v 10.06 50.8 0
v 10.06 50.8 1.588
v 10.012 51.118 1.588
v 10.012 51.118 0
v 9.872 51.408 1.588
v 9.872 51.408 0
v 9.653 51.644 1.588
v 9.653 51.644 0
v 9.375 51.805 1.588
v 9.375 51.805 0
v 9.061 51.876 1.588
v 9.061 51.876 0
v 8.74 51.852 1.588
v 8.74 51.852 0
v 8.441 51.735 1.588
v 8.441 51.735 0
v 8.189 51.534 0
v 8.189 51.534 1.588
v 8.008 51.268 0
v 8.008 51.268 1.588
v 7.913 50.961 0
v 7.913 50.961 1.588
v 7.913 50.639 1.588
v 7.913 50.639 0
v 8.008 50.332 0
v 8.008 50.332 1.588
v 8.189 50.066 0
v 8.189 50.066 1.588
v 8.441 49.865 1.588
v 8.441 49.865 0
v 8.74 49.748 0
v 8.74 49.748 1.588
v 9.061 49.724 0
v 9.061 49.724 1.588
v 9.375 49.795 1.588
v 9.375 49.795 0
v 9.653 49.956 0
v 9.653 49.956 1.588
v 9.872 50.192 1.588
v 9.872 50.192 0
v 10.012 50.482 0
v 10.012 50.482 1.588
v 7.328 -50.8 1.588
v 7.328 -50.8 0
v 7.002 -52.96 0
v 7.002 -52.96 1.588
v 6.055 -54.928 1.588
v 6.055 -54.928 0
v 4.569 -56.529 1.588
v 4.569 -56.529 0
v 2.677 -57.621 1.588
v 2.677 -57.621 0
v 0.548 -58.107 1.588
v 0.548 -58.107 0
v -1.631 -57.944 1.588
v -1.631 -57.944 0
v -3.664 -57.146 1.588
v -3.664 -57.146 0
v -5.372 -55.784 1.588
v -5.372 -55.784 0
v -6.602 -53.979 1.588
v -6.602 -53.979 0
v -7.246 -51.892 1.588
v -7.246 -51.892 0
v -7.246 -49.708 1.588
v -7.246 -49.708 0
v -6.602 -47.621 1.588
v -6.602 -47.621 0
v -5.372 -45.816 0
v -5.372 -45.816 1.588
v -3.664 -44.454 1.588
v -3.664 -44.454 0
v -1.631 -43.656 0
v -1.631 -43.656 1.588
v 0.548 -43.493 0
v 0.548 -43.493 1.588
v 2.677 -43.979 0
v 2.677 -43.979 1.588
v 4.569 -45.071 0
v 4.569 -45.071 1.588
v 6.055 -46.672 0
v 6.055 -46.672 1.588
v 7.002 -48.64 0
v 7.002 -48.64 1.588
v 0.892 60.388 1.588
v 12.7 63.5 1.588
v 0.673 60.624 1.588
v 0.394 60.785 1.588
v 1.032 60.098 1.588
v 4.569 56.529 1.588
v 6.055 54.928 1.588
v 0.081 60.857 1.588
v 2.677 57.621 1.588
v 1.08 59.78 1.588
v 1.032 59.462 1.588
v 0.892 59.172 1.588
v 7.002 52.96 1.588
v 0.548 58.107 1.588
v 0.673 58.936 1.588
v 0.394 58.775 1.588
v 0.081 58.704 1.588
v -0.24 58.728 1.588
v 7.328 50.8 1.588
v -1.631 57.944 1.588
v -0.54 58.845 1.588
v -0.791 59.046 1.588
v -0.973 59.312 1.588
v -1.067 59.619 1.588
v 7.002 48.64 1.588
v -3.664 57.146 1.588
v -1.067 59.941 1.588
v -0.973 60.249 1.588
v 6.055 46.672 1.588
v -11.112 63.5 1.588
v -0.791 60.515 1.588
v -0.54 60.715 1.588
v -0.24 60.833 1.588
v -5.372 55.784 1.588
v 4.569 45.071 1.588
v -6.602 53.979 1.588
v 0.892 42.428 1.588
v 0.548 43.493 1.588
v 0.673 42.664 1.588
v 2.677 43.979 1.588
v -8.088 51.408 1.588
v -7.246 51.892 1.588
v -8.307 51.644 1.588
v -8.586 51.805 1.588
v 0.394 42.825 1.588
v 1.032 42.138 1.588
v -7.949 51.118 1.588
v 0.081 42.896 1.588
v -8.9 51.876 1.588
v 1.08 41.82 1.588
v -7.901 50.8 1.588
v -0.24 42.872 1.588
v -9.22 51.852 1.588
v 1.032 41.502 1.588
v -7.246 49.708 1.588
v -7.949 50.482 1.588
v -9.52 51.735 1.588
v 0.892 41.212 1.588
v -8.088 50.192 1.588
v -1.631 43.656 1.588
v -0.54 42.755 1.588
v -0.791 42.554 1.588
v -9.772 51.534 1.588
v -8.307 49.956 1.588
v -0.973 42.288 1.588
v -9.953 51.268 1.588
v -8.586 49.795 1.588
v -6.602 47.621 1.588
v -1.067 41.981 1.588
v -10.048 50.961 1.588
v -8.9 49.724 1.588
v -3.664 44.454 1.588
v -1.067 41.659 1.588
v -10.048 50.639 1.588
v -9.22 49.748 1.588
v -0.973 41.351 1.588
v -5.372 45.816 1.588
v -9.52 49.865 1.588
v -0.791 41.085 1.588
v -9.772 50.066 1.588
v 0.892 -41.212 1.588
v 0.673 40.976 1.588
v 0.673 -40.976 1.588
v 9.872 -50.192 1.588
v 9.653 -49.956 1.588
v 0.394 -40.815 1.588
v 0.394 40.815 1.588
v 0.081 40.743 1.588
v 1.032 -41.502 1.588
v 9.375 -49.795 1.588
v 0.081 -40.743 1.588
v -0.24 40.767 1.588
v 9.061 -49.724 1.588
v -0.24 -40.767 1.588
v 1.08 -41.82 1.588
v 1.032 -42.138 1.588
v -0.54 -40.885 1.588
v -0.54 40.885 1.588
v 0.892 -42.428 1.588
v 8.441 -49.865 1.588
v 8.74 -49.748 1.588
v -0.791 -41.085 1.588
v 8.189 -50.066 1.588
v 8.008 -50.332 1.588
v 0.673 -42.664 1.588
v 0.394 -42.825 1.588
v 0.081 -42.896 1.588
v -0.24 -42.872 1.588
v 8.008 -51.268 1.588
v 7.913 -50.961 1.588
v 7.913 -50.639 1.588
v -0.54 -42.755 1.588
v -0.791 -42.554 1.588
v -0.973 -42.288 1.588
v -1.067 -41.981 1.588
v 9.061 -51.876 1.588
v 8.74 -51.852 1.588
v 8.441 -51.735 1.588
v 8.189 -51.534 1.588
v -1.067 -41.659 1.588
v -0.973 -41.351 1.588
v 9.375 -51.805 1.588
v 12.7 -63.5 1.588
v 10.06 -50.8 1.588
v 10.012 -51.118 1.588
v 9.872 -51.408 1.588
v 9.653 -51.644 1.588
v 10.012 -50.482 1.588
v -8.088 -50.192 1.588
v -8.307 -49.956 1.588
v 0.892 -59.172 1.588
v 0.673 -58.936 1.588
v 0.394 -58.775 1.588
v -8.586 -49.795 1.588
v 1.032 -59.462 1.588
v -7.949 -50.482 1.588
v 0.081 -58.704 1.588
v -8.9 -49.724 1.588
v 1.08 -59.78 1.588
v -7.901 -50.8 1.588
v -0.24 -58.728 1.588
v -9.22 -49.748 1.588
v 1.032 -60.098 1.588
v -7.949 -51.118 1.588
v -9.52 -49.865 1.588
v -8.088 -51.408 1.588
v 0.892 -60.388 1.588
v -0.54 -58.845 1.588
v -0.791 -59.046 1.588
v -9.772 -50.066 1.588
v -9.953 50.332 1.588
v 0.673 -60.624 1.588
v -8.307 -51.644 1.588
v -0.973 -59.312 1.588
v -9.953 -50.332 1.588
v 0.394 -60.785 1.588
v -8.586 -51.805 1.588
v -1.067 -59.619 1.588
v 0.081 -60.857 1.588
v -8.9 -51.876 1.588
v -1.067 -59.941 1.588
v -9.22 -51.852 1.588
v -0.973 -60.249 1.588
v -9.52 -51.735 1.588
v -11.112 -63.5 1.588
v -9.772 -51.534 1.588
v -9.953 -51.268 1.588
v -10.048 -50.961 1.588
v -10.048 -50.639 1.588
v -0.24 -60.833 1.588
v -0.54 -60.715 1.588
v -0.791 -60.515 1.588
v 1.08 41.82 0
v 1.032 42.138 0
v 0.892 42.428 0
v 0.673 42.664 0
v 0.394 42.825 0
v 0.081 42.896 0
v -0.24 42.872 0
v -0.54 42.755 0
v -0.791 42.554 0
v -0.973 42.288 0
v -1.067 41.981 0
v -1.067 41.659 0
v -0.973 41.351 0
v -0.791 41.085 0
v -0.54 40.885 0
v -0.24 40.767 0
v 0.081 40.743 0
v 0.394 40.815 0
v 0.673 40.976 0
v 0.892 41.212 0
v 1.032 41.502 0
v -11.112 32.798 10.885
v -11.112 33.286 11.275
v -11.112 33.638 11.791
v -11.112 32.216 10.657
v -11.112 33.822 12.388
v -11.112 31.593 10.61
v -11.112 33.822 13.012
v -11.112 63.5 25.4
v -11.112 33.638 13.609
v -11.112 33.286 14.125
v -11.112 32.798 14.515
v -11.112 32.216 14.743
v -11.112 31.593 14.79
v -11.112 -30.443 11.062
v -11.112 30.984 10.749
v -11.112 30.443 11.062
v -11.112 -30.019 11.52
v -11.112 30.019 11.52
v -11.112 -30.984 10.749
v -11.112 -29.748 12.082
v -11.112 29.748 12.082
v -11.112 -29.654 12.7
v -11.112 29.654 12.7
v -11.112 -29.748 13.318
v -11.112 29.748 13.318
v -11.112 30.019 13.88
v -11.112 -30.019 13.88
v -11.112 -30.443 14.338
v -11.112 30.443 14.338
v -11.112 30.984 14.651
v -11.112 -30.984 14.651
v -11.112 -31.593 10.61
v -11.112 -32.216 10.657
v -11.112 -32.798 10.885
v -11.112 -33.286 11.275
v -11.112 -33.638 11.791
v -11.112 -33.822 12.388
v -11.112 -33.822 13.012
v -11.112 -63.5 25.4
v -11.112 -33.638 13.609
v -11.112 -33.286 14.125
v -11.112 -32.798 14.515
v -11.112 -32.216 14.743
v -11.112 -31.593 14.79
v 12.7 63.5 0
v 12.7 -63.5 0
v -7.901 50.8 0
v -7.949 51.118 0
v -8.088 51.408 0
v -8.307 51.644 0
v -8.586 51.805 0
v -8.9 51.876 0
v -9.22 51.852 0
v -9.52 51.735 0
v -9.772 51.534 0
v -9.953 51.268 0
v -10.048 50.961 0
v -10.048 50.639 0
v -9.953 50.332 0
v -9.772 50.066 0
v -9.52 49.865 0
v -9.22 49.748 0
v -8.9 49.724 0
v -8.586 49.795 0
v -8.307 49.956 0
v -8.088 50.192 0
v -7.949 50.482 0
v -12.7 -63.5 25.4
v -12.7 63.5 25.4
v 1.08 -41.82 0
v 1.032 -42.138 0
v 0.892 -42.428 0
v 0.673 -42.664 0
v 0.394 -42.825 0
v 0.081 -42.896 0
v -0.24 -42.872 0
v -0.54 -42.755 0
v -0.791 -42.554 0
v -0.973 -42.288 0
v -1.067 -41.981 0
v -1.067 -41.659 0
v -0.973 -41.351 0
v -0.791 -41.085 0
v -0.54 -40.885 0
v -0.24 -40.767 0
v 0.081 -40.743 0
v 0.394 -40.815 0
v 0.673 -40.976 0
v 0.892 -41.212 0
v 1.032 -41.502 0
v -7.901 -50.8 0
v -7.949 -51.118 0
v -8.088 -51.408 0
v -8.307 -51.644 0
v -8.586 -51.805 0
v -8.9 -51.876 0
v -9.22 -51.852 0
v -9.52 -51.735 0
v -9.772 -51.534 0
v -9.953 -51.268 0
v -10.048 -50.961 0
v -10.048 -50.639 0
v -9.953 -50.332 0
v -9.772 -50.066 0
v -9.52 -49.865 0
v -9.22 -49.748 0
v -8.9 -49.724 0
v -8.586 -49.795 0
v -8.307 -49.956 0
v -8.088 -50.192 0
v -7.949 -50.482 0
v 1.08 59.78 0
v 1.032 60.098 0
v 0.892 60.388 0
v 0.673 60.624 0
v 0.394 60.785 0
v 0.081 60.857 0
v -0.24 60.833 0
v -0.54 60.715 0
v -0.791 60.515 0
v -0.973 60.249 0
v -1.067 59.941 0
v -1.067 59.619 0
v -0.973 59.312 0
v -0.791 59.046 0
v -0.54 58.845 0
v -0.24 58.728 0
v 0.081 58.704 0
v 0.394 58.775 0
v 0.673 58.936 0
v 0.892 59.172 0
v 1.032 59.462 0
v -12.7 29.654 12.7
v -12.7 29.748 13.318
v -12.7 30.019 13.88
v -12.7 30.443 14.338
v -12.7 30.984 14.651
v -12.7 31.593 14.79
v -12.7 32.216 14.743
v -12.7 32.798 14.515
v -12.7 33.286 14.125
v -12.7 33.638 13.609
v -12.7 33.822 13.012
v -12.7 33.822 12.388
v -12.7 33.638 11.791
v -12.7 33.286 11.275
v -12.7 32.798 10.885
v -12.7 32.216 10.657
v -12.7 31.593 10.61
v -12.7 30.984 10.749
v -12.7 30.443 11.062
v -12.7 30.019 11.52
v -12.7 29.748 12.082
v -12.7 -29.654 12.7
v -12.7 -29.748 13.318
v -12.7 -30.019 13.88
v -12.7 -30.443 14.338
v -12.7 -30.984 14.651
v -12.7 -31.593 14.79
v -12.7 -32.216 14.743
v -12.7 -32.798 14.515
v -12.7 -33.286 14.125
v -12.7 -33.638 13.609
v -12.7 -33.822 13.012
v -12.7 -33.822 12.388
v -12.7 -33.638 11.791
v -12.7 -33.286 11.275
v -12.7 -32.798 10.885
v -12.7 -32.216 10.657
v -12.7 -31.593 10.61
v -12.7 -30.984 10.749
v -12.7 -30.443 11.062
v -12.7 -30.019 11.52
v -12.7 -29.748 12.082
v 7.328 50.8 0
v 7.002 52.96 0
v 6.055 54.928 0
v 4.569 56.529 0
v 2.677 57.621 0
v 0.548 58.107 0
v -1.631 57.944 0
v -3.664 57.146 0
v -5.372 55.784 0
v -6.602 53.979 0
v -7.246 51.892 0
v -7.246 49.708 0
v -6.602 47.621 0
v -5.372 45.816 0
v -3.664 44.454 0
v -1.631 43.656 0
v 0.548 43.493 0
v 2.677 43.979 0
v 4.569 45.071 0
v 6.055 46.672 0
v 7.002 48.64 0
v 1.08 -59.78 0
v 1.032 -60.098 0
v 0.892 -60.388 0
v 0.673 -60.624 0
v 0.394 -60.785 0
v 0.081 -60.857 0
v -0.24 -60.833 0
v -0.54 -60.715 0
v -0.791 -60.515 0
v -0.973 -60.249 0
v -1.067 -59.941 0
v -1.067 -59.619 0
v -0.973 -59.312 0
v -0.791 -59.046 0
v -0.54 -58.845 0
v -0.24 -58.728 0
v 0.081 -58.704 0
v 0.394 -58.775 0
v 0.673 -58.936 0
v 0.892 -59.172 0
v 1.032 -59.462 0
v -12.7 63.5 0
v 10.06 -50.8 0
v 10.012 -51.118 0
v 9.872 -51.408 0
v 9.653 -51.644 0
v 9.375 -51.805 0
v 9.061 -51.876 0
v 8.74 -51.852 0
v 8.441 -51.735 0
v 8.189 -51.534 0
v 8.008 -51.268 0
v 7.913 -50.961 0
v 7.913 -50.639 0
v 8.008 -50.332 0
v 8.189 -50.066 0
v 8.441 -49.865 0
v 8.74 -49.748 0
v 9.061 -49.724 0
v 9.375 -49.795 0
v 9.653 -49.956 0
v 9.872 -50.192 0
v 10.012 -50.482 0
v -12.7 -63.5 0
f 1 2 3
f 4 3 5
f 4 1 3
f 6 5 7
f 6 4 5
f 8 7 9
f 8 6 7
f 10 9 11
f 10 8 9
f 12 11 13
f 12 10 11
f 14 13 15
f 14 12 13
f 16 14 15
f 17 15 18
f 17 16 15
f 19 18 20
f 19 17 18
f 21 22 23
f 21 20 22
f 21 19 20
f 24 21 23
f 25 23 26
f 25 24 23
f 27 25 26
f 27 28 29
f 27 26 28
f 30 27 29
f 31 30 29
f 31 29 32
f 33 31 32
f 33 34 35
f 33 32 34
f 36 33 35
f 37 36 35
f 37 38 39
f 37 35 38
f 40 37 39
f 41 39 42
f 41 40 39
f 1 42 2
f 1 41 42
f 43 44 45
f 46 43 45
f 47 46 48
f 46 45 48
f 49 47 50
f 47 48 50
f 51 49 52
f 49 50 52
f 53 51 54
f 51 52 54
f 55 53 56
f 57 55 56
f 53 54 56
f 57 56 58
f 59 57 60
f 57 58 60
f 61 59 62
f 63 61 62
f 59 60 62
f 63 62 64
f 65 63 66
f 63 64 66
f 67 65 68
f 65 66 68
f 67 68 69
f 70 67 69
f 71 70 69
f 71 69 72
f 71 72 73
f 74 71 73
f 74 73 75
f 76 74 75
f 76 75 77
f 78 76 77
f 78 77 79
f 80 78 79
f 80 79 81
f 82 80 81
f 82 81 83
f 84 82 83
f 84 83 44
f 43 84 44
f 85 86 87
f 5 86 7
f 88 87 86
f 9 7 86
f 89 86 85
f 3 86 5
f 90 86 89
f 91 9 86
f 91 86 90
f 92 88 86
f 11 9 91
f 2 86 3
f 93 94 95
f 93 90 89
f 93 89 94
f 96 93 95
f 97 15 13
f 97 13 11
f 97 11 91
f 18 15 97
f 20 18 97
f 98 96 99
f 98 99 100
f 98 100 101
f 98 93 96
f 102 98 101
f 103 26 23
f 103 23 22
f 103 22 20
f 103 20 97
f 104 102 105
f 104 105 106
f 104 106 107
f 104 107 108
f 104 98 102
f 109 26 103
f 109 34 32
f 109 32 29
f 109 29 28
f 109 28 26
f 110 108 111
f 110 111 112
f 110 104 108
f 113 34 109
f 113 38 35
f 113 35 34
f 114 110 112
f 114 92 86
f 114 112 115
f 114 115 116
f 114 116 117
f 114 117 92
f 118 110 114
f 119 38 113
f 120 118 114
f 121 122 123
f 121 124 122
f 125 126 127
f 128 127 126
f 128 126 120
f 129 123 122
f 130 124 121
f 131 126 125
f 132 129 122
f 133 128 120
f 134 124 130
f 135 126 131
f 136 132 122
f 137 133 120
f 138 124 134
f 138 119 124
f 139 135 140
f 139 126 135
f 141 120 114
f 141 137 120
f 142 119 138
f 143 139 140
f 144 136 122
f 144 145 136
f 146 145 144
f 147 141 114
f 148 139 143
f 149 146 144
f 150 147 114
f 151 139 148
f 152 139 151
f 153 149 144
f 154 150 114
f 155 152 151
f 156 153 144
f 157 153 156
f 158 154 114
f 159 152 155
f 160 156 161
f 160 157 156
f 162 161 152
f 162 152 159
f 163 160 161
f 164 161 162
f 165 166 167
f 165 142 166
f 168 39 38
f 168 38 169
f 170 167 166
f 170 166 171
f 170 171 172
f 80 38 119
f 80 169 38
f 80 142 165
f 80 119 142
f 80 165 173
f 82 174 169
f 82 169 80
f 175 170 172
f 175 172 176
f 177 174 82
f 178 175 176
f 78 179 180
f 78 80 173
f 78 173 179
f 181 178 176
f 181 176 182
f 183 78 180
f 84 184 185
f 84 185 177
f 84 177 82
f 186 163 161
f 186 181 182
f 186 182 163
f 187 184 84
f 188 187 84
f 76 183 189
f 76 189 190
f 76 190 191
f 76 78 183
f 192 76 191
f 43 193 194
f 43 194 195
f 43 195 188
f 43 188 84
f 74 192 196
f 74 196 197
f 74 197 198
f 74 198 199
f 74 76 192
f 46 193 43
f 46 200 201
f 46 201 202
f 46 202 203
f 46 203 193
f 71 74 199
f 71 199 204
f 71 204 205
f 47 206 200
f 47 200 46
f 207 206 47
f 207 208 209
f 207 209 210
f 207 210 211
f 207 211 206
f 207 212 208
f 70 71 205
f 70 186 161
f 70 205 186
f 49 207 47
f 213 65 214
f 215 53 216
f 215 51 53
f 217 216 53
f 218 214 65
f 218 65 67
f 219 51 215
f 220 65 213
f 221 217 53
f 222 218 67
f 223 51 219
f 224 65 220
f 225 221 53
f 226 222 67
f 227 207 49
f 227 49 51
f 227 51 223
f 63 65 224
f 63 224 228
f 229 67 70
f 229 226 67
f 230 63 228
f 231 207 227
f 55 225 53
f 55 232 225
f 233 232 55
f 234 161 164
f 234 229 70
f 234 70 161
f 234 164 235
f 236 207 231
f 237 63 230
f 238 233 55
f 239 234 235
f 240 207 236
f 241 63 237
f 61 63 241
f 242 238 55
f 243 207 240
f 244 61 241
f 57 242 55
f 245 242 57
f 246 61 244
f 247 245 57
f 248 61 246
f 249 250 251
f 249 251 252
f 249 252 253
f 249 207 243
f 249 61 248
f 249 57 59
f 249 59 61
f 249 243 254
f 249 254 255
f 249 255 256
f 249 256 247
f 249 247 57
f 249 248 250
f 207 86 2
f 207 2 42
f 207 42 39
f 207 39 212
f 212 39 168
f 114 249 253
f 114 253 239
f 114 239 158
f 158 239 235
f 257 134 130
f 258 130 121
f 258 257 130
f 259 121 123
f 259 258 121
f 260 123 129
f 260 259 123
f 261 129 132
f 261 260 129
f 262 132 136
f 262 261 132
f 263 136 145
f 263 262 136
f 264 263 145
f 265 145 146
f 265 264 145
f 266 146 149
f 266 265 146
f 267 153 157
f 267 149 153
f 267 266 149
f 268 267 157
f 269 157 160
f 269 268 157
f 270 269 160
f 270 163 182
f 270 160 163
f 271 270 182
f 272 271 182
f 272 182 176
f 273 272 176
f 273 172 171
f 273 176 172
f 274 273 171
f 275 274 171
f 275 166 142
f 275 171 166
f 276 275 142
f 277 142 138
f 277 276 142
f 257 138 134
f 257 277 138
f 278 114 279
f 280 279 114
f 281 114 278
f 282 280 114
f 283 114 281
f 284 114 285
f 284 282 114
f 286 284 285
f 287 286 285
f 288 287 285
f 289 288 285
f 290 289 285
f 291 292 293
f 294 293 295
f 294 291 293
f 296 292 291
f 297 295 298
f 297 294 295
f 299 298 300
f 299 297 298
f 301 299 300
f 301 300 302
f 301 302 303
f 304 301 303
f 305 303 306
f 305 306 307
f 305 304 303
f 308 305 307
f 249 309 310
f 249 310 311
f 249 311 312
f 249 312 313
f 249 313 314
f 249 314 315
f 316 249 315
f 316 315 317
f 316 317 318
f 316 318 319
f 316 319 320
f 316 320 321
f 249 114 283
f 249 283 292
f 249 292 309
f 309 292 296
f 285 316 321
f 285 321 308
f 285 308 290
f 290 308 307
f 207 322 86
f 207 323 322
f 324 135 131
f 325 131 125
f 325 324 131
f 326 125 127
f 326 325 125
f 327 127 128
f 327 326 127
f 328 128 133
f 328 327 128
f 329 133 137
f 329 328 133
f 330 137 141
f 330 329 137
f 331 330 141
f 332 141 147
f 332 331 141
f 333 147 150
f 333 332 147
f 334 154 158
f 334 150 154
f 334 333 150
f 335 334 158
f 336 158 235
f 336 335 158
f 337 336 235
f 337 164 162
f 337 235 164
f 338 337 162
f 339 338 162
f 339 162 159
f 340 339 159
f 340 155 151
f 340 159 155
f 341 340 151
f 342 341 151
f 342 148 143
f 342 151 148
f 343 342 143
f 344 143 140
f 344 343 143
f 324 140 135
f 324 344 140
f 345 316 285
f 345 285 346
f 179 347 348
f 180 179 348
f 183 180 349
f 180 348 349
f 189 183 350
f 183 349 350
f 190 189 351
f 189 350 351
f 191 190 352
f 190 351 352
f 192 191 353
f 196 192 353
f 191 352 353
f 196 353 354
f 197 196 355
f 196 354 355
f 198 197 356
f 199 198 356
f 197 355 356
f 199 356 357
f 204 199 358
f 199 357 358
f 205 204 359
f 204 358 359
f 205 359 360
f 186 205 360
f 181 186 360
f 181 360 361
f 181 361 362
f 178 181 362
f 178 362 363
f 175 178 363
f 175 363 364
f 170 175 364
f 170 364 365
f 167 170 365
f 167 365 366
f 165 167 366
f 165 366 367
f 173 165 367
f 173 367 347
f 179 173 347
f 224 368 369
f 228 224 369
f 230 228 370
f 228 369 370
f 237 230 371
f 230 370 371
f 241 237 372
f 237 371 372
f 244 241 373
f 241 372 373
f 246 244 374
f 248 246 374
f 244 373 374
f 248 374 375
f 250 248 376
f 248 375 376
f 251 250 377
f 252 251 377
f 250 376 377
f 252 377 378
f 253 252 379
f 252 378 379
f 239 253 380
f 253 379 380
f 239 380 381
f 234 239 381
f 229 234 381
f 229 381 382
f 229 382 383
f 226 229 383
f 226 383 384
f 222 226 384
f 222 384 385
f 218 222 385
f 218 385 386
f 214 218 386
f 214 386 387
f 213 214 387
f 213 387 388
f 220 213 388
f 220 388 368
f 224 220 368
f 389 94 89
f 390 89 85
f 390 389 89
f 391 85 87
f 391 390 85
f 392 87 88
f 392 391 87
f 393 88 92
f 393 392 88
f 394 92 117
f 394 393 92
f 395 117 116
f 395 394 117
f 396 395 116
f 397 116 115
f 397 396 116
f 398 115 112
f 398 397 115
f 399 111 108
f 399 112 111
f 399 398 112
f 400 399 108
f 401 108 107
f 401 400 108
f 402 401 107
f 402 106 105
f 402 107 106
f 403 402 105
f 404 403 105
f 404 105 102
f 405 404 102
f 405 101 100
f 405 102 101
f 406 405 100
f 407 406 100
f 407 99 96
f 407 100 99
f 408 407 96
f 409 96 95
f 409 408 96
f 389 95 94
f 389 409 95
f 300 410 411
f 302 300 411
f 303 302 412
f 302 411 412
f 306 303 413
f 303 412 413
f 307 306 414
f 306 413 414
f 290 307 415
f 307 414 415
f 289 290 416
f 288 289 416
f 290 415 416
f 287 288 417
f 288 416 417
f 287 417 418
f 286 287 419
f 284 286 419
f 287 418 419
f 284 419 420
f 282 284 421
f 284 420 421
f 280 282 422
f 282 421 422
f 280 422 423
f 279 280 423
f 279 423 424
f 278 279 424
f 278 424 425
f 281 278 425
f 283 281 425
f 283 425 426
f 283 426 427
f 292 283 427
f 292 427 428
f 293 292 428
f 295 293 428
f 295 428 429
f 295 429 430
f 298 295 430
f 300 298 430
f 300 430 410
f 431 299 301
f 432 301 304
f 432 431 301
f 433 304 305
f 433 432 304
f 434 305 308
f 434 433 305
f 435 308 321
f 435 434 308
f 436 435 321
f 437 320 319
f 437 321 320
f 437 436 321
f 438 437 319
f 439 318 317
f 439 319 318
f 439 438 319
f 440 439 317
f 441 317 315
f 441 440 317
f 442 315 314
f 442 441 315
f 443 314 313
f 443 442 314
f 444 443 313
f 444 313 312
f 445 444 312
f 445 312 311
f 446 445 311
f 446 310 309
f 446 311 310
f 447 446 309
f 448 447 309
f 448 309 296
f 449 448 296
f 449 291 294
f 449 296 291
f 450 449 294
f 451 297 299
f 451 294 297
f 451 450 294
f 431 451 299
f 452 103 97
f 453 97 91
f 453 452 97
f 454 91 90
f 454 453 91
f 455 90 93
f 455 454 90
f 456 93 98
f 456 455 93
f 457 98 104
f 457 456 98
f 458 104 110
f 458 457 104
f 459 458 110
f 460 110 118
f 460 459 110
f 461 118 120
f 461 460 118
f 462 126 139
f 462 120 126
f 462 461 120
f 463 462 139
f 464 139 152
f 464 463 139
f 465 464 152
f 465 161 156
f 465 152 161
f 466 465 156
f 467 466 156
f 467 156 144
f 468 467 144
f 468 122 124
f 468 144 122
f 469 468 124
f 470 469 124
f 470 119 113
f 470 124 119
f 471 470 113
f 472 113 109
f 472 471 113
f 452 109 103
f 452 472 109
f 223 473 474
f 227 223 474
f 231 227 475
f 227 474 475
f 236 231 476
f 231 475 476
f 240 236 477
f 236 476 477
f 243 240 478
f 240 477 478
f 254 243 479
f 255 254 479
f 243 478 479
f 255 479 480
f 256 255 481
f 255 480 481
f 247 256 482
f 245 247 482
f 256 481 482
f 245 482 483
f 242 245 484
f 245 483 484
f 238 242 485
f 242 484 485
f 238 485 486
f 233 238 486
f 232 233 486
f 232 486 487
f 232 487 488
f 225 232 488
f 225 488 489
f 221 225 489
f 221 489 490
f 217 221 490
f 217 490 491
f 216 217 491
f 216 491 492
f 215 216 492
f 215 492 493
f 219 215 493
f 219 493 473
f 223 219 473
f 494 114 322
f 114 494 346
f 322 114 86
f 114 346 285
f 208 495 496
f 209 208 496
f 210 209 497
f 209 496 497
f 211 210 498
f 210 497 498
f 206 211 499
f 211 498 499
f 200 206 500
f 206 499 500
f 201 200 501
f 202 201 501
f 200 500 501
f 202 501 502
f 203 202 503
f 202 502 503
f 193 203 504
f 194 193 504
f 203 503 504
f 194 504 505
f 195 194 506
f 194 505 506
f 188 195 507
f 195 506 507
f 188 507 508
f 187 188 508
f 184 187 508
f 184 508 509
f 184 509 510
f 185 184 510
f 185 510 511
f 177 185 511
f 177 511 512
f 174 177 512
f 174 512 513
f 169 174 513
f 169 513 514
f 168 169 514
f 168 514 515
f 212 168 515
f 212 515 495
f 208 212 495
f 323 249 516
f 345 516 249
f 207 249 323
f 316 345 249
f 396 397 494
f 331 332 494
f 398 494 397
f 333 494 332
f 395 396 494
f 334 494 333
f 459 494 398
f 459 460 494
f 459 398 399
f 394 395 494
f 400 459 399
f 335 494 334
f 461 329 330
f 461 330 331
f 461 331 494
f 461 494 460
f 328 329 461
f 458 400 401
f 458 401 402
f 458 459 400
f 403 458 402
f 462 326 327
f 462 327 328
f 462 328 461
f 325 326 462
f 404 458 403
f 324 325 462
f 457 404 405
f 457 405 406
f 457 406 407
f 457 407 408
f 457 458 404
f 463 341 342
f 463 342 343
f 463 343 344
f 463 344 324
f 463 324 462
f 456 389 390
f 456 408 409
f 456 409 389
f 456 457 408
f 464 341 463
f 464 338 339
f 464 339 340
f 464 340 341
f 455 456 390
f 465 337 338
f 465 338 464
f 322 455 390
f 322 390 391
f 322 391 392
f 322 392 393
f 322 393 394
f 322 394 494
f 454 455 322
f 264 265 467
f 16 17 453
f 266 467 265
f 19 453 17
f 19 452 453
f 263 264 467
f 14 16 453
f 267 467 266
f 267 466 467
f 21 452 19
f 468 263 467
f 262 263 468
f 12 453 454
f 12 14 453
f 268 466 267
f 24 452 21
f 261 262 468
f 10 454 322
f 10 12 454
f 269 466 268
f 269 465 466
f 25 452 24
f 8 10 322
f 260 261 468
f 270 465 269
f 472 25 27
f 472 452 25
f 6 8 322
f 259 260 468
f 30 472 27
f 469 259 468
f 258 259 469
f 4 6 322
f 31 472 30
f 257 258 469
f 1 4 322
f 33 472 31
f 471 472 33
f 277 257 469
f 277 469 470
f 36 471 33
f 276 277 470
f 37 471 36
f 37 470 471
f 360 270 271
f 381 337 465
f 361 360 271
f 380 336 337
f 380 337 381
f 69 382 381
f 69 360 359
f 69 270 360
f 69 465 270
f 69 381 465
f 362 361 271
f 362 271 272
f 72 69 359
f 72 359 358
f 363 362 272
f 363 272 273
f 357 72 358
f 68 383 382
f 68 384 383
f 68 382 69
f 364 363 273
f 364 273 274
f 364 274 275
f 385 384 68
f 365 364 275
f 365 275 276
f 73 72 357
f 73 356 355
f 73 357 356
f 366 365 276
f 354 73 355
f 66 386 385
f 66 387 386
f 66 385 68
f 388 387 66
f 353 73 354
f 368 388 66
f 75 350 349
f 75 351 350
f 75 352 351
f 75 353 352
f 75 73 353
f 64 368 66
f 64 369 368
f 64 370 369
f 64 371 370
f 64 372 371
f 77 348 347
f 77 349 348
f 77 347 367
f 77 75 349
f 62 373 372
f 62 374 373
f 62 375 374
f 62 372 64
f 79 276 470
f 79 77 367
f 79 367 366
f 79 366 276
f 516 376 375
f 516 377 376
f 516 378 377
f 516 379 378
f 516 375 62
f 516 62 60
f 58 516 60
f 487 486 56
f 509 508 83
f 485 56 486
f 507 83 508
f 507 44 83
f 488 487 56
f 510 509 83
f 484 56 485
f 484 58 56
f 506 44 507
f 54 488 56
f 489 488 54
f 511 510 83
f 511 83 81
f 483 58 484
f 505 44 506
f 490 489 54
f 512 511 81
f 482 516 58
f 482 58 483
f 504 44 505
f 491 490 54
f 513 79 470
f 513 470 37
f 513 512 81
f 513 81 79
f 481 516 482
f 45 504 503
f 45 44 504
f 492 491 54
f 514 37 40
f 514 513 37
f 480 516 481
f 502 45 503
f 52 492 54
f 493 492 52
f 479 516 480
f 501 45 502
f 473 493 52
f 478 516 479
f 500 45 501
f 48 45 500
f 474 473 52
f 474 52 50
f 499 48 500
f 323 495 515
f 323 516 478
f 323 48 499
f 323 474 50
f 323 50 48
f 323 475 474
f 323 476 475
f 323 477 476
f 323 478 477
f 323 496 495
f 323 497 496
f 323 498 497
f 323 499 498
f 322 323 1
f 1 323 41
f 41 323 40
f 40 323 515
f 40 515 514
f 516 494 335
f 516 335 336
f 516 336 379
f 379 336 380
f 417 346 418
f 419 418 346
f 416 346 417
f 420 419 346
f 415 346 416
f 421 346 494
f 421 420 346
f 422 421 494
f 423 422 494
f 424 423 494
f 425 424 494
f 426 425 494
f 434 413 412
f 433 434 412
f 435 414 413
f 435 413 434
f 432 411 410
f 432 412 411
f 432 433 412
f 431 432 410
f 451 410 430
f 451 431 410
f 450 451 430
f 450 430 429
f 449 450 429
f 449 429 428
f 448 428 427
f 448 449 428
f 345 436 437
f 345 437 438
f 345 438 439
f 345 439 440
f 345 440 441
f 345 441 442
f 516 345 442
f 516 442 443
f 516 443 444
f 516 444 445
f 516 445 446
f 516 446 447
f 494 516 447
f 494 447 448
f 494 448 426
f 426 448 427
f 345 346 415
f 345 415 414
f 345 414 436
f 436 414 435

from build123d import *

# Parameters (mm, degrees)
F2_DEPTH = 63.5
F0_R     = 7.3279
F0_R_2   = 1.0795
F3_DEPTH = 25.401
F4_R     = 2.0955
F5_DEPTH = 25.401


with BuildPart() as f2:
    # F1 (on Front) → F2 (new body, symmetric)
    with BuildSketch(Plane.XZ):
        Polygon((12.7, 0), (12.7, 1.5875), (-11.1125, 1.5875), (-11.1125, 25.4), (-12.7, 25.4), (-12.7, 0), align=None)
    extrude(amount=F2_DEPTH, both=True)


with BuildPart() as f3:
    # F0 (on Top) → F3 (new body, through all)
    with BuildSketch(Plane.XY):
        with Locations((0, 50.8)):
            Circle(F0_R)
        with Locations((0, 59.780256)):
            Circle(F0_R_2)
        with Locations((8.980256, 50.8)):
            Circle(F0_R_2)
        with Locations((0, 41.819744)):
            Circle(F0_R_2)
        with Locations((-8.980256, 50.8)):
            Circle(F0_R_2)
    extrude(amount=F3_DEPTH)


with BuildPart() as f5:
    # F4 (on face) → F5 (new body, through all)
    with BuildSketch(Plane(origin=(-12.7, 0, 0), x_dir=(0, -1, 0), z_dir=(-1, 0, 0))):
        with Locations((-31.75, 12.7)):
            Circle(F4_R)
    extrude(amount=-F5_DEPTH)


with BuildPart() as f6_1:
    # F6: instance of F3
    add(f3.part.mirror(Plane.XZ))


with BuildPart() as f6_2:
    # F6: instance of F5
    add(f5.part.mirror(Plane.XZ))


with BuildPart() as f2_1:
    add(f2.part)

    # F7: cut F5, F6_2, F3, F6_1
    add(f5.part, mode=Mode.SUBTRACT)
    add(f6_2.part, mode=Mode.SUBTRACT)
    add(f3.part, mode=Mode.SUBTRACT)
    add(f6_1.part, mode=Mode.SUBTRACT)


solid = f2_1.part
